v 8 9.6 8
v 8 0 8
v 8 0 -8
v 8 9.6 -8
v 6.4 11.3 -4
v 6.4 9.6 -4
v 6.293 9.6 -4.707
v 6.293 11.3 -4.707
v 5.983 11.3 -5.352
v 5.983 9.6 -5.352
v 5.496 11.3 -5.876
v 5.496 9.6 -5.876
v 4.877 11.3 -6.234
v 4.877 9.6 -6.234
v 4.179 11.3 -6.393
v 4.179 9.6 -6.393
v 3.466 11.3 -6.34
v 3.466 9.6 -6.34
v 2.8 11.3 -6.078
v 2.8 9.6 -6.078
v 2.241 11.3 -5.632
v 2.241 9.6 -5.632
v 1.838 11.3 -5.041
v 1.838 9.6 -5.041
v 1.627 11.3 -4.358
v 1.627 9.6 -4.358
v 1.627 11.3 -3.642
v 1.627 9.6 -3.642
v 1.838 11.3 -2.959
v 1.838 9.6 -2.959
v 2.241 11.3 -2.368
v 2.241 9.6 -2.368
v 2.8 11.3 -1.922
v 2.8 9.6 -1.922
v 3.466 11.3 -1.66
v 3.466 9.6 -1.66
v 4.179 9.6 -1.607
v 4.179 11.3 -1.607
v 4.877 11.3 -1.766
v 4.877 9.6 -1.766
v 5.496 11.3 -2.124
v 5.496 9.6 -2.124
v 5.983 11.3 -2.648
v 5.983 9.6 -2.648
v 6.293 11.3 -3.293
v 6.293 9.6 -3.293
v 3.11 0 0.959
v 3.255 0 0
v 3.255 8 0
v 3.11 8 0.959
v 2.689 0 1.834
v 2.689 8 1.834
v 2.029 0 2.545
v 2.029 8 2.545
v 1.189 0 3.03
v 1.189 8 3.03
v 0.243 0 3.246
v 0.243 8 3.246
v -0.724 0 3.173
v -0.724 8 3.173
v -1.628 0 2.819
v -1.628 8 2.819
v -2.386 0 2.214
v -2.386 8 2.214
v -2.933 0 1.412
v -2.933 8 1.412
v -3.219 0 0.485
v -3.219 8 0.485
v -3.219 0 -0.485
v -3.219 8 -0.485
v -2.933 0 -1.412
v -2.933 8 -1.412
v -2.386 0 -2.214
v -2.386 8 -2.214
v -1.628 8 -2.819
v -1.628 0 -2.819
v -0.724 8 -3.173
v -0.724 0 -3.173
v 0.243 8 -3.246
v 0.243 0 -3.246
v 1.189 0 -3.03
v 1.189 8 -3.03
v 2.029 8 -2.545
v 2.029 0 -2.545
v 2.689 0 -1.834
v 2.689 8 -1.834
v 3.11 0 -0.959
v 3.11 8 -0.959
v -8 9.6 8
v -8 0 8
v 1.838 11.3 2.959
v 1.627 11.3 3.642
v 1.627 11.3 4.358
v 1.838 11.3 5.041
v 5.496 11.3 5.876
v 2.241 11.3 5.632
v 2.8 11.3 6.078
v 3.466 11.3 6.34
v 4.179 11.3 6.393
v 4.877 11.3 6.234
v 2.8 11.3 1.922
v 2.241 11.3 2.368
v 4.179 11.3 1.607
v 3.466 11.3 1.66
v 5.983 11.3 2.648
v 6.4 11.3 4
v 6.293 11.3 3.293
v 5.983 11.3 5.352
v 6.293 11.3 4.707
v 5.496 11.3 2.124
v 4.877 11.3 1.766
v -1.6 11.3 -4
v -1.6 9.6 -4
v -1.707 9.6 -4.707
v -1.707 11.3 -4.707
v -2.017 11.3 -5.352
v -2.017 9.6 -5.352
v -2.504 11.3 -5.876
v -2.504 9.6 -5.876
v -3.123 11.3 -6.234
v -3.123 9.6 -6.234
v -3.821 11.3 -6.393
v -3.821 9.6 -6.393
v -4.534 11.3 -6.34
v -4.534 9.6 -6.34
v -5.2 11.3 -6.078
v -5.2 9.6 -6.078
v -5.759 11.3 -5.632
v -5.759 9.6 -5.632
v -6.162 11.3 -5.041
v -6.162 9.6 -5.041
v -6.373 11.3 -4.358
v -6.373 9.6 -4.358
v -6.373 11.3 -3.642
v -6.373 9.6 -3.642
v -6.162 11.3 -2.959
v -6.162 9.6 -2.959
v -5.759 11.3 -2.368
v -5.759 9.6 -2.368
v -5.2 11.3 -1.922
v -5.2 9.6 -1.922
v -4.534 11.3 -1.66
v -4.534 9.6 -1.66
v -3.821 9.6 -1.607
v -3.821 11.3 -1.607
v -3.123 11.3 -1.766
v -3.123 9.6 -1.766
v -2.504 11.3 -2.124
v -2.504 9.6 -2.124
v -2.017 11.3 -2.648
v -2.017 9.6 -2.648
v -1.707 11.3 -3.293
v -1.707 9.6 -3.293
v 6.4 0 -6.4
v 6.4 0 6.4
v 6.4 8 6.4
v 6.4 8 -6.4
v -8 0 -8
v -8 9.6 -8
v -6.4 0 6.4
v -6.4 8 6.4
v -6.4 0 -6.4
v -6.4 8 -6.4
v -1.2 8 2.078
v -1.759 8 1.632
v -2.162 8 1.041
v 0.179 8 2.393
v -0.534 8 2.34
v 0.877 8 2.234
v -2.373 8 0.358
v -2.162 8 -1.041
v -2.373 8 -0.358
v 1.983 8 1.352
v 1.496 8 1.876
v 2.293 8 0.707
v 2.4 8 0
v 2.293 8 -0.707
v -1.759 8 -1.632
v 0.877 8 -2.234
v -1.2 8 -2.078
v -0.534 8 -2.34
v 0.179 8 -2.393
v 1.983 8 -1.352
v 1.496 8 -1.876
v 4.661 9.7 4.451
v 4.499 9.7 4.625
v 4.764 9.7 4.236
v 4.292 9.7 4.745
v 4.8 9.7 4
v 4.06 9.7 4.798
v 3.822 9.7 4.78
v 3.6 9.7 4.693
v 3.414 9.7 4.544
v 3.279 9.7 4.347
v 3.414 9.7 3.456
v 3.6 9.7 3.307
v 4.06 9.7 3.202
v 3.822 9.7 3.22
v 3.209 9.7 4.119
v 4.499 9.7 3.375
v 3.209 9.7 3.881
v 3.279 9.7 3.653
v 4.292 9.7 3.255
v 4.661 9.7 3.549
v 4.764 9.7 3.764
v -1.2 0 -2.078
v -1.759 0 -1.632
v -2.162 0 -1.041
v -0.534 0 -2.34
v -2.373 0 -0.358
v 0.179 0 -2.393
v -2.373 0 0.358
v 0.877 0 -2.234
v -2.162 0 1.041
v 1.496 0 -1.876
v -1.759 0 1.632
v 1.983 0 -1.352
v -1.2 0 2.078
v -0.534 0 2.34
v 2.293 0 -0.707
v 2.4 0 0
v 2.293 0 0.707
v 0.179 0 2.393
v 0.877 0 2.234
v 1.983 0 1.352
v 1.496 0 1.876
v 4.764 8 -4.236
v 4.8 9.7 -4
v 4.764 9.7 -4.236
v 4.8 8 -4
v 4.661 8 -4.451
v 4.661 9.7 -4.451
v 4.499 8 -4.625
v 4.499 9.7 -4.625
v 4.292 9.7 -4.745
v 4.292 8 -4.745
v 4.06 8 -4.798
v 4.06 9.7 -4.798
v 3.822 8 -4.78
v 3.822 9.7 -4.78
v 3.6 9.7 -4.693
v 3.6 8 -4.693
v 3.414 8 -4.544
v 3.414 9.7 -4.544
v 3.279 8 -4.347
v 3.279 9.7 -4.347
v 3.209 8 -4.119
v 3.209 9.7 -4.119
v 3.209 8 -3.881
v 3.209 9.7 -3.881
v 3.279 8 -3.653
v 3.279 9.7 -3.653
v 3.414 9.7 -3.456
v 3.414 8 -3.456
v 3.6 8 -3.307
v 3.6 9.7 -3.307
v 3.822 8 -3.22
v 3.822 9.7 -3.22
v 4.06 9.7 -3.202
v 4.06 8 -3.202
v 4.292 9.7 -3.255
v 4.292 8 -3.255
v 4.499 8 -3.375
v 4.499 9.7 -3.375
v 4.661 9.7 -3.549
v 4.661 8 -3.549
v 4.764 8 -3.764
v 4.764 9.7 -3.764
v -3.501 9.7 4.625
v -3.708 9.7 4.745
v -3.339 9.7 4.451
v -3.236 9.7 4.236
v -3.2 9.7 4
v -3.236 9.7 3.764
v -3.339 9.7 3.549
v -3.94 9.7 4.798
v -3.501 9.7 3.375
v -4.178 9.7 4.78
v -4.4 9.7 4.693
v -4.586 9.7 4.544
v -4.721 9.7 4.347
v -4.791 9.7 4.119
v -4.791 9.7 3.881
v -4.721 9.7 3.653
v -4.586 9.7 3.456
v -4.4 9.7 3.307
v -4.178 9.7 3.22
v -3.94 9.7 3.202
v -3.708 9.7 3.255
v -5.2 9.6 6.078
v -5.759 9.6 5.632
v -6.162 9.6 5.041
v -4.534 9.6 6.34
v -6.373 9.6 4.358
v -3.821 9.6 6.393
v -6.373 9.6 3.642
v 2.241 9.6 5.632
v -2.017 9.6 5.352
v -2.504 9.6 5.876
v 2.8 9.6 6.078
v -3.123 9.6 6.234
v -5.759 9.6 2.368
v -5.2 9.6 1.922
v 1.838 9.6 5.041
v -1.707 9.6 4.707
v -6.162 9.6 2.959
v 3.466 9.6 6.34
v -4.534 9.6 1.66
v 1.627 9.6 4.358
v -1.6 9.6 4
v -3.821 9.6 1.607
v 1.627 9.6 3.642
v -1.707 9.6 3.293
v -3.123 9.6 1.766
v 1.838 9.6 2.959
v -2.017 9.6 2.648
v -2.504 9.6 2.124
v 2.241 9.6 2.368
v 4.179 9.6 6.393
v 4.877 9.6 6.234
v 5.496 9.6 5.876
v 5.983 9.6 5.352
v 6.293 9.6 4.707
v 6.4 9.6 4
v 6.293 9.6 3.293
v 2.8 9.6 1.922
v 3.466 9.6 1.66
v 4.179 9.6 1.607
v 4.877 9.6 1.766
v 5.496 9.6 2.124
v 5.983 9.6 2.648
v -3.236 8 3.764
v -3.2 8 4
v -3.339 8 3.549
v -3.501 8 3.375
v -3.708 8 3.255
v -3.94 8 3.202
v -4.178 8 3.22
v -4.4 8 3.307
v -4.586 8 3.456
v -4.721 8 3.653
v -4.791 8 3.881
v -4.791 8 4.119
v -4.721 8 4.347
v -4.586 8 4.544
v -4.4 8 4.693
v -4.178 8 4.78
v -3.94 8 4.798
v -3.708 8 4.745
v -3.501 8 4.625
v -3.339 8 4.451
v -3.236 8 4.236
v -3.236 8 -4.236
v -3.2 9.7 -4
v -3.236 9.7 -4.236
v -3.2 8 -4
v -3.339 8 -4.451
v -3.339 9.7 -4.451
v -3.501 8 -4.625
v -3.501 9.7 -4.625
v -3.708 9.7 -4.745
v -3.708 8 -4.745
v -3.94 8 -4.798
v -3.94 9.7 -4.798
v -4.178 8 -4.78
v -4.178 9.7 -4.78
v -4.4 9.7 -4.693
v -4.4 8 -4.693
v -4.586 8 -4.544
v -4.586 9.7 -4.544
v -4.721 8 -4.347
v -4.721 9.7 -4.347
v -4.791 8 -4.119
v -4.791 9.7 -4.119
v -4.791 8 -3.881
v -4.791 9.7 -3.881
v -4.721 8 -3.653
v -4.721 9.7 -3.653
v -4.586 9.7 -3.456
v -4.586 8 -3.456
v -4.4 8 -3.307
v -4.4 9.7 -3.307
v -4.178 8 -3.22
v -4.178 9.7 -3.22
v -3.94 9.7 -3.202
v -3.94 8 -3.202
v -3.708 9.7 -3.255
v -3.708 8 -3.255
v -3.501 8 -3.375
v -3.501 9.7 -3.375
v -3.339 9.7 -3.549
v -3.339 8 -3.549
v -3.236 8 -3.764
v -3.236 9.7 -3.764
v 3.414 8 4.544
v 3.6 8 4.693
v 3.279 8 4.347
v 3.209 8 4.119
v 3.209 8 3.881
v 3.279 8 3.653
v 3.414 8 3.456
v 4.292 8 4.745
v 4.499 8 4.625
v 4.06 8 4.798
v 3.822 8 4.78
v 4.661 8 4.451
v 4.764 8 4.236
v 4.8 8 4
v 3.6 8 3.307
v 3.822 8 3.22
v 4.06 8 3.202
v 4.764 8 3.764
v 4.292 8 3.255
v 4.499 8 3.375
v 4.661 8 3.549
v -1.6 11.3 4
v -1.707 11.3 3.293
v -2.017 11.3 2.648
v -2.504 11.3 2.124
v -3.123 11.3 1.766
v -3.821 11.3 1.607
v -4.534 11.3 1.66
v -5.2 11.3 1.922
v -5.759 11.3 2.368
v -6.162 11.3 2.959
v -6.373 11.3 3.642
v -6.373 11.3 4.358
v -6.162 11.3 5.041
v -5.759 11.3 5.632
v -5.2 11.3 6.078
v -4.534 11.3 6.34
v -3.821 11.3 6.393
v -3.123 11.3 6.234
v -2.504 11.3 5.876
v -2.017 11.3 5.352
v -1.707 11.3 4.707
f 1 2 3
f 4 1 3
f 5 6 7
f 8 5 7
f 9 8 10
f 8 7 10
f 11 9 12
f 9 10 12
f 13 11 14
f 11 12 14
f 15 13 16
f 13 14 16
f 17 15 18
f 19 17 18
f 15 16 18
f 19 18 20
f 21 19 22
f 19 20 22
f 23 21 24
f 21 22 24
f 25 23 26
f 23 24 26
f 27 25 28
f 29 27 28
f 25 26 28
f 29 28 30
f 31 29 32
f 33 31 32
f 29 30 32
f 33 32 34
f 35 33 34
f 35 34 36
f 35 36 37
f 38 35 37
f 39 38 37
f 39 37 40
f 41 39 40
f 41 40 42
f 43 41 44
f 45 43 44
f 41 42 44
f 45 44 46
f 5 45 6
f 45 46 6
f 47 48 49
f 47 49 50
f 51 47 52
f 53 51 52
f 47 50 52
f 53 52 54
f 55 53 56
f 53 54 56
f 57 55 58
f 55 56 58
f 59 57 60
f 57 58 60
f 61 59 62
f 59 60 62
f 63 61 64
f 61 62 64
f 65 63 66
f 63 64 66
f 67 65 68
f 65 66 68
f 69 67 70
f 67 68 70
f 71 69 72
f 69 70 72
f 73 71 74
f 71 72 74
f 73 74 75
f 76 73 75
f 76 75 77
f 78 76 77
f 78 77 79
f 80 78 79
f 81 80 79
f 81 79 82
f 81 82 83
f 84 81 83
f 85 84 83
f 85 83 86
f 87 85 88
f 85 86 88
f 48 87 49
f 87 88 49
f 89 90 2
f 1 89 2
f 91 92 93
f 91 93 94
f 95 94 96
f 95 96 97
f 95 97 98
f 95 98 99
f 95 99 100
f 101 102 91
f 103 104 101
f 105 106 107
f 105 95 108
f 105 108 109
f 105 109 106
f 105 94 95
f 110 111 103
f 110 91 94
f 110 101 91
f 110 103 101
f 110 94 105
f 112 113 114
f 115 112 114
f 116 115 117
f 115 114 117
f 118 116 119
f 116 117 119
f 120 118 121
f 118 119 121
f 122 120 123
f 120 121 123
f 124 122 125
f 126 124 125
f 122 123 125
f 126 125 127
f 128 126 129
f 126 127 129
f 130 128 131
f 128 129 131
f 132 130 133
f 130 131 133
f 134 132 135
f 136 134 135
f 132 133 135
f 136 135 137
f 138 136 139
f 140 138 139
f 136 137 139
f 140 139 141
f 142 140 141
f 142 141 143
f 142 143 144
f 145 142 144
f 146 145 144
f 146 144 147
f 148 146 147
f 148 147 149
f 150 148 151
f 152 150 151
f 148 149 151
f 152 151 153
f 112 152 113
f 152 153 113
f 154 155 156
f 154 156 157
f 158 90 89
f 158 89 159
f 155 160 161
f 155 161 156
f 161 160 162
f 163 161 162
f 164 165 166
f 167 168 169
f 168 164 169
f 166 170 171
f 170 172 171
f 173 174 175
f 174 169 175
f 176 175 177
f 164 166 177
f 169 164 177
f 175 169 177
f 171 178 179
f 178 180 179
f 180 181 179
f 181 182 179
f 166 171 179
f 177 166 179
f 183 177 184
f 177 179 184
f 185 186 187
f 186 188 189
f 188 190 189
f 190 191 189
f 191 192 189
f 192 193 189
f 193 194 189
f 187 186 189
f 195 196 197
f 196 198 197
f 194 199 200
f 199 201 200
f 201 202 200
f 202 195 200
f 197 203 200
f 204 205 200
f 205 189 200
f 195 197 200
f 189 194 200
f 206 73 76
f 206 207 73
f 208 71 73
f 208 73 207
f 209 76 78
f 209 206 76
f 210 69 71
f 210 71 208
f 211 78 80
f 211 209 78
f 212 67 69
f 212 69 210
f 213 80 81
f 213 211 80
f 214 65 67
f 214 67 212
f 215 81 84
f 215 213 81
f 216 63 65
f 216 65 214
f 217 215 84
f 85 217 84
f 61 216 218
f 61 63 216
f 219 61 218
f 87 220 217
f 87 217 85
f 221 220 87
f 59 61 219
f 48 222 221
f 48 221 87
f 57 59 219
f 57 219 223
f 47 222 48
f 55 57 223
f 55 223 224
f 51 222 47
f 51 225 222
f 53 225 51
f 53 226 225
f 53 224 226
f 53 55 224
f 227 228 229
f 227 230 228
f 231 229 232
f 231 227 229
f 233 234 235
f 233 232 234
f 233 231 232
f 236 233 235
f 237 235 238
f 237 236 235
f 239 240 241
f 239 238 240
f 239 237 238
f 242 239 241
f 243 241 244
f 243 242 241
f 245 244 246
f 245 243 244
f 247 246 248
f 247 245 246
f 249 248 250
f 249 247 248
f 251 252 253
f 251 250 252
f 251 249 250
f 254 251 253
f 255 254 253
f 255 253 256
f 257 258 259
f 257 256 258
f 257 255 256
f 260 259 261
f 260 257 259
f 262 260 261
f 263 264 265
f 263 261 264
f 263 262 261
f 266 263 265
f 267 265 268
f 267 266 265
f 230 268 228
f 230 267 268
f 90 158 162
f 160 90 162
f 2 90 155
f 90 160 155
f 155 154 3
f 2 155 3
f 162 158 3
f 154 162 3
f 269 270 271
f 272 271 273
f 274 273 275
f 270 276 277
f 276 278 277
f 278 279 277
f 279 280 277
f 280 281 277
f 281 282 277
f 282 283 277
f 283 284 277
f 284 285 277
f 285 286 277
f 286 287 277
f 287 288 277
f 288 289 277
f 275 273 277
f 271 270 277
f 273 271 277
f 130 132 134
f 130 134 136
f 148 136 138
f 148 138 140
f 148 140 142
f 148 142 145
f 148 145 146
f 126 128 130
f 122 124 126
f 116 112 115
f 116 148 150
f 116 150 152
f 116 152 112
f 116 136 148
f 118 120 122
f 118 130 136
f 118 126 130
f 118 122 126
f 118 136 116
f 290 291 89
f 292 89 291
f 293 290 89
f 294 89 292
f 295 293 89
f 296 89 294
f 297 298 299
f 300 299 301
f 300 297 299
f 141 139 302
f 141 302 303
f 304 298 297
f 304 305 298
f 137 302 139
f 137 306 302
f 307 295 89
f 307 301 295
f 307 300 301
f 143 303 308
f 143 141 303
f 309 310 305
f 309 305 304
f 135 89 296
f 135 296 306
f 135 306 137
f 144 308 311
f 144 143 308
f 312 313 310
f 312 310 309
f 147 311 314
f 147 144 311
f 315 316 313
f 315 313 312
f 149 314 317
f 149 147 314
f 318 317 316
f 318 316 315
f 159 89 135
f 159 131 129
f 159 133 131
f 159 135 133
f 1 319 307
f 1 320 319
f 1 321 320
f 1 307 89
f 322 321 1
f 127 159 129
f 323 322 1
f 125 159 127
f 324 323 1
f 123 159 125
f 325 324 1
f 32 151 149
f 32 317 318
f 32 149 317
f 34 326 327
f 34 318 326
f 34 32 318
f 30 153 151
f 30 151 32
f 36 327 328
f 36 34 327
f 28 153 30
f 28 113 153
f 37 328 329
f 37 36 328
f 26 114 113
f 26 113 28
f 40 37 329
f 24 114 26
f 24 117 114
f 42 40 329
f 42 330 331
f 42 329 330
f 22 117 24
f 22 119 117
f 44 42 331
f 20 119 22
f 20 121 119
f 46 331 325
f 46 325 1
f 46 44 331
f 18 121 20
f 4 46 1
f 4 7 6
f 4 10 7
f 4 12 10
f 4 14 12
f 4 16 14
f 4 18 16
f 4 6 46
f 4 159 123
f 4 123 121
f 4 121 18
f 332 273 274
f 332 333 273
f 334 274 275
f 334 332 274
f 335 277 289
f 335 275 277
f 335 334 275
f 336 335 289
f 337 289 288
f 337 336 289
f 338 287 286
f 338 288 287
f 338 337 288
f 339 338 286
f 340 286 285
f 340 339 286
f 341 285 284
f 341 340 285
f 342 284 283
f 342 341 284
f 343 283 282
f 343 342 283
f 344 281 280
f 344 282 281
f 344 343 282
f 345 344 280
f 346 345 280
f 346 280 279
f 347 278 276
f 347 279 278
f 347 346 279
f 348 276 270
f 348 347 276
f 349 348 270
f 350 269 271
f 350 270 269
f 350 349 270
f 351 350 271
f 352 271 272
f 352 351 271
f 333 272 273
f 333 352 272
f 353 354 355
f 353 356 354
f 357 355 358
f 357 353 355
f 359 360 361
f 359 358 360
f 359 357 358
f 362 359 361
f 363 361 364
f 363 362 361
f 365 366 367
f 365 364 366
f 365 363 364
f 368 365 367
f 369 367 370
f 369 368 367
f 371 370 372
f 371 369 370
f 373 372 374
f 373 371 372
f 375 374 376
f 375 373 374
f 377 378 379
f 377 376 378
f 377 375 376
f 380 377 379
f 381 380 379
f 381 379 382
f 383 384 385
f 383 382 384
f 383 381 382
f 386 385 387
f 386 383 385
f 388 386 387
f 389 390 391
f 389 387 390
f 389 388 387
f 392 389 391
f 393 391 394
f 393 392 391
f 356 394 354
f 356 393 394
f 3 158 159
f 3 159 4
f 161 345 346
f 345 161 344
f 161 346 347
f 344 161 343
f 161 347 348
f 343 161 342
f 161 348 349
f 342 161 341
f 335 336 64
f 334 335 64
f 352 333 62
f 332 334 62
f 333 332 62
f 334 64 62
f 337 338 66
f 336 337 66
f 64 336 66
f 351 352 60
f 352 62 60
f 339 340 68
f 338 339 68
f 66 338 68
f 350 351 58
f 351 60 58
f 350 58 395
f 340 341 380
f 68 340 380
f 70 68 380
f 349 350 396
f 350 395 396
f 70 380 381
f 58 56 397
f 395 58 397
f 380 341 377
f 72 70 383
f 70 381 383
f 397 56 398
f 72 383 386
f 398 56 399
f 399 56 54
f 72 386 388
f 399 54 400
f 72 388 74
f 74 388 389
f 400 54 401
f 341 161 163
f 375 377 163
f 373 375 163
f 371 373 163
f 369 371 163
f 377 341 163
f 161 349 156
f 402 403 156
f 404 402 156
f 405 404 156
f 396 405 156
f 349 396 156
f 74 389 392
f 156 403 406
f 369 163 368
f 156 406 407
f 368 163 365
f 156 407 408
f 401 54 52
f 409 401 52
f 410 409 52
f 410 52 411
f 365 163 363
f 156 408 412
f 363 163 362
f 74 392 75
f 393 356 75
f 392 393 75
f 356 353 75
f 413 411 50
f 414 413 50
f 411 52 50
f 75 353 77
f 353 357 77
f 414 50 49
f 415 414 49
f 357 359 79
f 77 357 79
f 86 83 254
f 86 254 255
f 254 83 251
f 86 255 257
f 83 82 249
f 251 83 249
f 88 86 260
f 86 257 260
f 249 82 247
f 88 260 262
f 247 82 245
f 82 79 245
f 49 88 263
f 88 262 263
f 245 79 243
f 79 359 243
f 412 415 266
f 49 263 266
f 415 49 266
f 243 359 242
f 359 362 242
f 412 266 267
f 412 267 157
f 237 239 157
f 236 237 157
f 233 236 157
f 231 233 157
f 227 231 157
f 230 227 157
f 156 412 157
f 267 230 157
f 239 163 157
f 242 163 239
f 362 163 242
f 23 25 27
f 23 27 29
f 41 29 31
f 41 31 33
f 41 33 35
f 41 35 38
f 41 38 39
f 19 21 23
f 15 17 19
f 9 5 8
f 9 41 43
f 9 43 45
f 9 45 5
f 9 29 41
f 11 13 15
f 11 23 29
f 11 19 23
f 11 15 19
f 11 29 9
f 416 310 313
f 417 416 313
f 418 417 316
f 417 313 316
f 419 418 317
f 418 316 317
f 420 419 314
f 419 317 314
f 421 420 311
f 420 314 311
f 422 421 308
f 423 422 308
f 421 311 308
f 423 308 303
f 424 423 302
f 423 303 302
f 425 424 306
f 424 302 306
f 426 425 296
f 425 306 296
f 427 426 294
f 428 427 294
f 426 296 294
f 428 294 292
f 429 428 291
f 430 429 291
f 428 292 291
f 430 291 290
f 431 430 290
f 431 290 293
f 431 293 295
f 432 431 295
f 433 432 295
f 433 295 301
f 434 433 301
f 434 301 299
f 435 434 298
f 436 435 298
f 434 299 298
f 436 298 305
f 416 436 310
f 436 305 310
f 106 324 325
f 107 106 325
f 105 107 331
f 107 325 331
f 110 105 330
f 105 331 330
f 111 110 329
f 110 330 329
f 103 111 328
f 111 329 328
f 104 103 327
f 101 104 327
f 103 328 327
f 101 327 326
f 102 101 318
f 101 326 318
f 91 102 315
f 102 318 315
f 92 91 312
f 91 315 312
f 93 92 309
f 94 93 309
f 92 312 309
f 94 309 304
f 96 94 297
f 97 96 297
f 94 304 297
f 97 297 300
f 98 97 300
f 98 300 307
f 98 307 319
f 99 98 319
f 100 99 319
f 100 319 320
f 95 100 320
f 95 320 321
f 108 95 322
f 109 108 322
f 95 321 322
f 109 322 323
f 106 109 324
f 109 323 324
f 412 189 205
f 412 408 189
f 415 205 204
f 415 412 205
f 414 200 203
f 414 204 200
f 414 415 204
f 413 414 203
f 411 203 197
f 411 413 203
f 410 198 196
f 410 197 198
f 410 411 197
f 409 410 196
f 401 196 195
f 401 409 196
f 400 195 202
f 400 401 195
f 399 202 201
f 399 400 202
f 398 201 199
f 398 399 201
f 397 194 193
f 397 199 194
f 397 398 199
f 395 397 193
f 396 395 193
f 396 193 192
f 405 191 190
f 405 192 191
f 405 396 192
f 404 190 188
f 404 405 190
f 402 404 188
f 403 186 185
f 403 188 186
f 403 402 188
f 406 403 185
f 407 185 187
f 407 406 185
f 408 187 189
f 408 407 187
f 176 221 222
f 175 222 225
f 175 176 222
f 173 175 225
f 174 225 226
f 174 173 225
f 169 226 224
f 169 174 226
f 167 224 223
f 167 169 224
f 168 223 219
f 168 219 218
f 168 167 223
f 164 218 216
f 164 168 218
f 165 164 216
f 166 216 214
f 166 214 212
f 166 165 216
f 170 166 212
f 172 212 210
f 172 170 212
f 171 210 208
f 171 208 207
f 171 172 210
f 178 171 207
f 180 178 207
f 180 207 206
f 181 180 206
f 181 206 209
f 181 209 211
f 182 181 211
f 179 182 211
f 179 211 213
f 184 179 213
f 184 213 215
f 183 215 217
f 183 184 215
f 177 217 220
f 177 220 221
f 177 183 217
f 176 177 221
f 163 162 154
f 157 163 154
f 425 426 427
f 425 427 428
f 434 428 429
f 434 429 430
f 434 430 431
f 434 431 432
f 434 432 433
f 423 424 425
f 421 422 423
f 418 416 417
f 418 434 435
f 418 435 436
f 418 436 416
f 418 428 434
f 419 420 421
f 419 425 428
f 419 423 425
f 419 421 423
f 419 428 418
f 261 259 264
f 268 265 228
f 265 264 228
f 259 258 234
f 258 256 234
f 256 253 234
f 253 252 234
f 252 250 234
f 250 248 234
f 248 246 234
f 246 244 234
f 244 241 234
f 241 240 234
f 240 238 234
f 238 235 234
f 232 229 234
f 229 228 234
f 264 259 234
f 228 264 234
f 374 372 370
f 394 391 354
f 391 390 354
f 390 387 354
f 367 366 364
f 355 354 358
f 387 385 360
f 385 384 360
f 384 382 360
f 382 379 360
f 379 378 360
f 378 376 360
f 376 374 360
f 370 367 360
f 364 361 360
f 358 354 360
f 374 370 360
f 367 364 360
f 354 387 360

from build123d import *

# Parameters (mm, degrees)
SKETCH_1_W      = 16
SKETCH_1_H      = 16
HEIGHT_DEPTH    = 9.6
SKETCH_2_R      = 2.4
EXTRUDE_2_DEPTH = 1.7
SHELL_1_T       = -1.6
SKETCH_3_R      = 3.255
SKETCH_3_R_2    = 2.4
EXTRUDE_3_DEPTH = 8


with BuildPart() as part:
    # 草圖1 → height (new body)
    with BuildSketch(Plane(origin=(0, 0, 0), x_dir=(1, 0, 0), z_dir=(0, 1, 0))):
        Rectangle(SKETCH_1_W, SKETCH_1_H)
    extrude(amount=HEIGHT_DEPTH)

    # 草圖2 → 填料-伸長2 (add)
    with BuildSketch(Plane(origin=(0, 9.6, 0), x_dir=(1, 0, 0), z_dir=(0, 1, 0))):
        with Locations((-4, 4)):
            Circle(SKETCH_2_R)
        with Locations((4, 4)):
            Circle(SKETCH_2_R)
        with Locations((4, -4)):
            Circle(SKETCH_2_R)
        with Locations((-4, -4)):
            Circle(SKETCH_2_R)
    extrude(amount=EXTRUDE_2_DEPTH)

    # 薄殼1
    shell_1_openings = [part.faces().sort_by_distance(p)[0] for p in [
        (0, 0, 0),
    ]]
    offset(amount=SHELL_1_T, openings=shell_1_openings, kind=Kind.INTERSECTION)

    # 草圖3 → 填料-伸長3 (add)
    with BuildSketch(Plane.XZ.offset(-8)):
        Circle(SKETCH_3_R)
        Circle(SKETCH_3_R_2, mode=Mode.SUBTRACT)
    extrude(amount=EXTRUDE_3_DEPTH)


solid = part.part
